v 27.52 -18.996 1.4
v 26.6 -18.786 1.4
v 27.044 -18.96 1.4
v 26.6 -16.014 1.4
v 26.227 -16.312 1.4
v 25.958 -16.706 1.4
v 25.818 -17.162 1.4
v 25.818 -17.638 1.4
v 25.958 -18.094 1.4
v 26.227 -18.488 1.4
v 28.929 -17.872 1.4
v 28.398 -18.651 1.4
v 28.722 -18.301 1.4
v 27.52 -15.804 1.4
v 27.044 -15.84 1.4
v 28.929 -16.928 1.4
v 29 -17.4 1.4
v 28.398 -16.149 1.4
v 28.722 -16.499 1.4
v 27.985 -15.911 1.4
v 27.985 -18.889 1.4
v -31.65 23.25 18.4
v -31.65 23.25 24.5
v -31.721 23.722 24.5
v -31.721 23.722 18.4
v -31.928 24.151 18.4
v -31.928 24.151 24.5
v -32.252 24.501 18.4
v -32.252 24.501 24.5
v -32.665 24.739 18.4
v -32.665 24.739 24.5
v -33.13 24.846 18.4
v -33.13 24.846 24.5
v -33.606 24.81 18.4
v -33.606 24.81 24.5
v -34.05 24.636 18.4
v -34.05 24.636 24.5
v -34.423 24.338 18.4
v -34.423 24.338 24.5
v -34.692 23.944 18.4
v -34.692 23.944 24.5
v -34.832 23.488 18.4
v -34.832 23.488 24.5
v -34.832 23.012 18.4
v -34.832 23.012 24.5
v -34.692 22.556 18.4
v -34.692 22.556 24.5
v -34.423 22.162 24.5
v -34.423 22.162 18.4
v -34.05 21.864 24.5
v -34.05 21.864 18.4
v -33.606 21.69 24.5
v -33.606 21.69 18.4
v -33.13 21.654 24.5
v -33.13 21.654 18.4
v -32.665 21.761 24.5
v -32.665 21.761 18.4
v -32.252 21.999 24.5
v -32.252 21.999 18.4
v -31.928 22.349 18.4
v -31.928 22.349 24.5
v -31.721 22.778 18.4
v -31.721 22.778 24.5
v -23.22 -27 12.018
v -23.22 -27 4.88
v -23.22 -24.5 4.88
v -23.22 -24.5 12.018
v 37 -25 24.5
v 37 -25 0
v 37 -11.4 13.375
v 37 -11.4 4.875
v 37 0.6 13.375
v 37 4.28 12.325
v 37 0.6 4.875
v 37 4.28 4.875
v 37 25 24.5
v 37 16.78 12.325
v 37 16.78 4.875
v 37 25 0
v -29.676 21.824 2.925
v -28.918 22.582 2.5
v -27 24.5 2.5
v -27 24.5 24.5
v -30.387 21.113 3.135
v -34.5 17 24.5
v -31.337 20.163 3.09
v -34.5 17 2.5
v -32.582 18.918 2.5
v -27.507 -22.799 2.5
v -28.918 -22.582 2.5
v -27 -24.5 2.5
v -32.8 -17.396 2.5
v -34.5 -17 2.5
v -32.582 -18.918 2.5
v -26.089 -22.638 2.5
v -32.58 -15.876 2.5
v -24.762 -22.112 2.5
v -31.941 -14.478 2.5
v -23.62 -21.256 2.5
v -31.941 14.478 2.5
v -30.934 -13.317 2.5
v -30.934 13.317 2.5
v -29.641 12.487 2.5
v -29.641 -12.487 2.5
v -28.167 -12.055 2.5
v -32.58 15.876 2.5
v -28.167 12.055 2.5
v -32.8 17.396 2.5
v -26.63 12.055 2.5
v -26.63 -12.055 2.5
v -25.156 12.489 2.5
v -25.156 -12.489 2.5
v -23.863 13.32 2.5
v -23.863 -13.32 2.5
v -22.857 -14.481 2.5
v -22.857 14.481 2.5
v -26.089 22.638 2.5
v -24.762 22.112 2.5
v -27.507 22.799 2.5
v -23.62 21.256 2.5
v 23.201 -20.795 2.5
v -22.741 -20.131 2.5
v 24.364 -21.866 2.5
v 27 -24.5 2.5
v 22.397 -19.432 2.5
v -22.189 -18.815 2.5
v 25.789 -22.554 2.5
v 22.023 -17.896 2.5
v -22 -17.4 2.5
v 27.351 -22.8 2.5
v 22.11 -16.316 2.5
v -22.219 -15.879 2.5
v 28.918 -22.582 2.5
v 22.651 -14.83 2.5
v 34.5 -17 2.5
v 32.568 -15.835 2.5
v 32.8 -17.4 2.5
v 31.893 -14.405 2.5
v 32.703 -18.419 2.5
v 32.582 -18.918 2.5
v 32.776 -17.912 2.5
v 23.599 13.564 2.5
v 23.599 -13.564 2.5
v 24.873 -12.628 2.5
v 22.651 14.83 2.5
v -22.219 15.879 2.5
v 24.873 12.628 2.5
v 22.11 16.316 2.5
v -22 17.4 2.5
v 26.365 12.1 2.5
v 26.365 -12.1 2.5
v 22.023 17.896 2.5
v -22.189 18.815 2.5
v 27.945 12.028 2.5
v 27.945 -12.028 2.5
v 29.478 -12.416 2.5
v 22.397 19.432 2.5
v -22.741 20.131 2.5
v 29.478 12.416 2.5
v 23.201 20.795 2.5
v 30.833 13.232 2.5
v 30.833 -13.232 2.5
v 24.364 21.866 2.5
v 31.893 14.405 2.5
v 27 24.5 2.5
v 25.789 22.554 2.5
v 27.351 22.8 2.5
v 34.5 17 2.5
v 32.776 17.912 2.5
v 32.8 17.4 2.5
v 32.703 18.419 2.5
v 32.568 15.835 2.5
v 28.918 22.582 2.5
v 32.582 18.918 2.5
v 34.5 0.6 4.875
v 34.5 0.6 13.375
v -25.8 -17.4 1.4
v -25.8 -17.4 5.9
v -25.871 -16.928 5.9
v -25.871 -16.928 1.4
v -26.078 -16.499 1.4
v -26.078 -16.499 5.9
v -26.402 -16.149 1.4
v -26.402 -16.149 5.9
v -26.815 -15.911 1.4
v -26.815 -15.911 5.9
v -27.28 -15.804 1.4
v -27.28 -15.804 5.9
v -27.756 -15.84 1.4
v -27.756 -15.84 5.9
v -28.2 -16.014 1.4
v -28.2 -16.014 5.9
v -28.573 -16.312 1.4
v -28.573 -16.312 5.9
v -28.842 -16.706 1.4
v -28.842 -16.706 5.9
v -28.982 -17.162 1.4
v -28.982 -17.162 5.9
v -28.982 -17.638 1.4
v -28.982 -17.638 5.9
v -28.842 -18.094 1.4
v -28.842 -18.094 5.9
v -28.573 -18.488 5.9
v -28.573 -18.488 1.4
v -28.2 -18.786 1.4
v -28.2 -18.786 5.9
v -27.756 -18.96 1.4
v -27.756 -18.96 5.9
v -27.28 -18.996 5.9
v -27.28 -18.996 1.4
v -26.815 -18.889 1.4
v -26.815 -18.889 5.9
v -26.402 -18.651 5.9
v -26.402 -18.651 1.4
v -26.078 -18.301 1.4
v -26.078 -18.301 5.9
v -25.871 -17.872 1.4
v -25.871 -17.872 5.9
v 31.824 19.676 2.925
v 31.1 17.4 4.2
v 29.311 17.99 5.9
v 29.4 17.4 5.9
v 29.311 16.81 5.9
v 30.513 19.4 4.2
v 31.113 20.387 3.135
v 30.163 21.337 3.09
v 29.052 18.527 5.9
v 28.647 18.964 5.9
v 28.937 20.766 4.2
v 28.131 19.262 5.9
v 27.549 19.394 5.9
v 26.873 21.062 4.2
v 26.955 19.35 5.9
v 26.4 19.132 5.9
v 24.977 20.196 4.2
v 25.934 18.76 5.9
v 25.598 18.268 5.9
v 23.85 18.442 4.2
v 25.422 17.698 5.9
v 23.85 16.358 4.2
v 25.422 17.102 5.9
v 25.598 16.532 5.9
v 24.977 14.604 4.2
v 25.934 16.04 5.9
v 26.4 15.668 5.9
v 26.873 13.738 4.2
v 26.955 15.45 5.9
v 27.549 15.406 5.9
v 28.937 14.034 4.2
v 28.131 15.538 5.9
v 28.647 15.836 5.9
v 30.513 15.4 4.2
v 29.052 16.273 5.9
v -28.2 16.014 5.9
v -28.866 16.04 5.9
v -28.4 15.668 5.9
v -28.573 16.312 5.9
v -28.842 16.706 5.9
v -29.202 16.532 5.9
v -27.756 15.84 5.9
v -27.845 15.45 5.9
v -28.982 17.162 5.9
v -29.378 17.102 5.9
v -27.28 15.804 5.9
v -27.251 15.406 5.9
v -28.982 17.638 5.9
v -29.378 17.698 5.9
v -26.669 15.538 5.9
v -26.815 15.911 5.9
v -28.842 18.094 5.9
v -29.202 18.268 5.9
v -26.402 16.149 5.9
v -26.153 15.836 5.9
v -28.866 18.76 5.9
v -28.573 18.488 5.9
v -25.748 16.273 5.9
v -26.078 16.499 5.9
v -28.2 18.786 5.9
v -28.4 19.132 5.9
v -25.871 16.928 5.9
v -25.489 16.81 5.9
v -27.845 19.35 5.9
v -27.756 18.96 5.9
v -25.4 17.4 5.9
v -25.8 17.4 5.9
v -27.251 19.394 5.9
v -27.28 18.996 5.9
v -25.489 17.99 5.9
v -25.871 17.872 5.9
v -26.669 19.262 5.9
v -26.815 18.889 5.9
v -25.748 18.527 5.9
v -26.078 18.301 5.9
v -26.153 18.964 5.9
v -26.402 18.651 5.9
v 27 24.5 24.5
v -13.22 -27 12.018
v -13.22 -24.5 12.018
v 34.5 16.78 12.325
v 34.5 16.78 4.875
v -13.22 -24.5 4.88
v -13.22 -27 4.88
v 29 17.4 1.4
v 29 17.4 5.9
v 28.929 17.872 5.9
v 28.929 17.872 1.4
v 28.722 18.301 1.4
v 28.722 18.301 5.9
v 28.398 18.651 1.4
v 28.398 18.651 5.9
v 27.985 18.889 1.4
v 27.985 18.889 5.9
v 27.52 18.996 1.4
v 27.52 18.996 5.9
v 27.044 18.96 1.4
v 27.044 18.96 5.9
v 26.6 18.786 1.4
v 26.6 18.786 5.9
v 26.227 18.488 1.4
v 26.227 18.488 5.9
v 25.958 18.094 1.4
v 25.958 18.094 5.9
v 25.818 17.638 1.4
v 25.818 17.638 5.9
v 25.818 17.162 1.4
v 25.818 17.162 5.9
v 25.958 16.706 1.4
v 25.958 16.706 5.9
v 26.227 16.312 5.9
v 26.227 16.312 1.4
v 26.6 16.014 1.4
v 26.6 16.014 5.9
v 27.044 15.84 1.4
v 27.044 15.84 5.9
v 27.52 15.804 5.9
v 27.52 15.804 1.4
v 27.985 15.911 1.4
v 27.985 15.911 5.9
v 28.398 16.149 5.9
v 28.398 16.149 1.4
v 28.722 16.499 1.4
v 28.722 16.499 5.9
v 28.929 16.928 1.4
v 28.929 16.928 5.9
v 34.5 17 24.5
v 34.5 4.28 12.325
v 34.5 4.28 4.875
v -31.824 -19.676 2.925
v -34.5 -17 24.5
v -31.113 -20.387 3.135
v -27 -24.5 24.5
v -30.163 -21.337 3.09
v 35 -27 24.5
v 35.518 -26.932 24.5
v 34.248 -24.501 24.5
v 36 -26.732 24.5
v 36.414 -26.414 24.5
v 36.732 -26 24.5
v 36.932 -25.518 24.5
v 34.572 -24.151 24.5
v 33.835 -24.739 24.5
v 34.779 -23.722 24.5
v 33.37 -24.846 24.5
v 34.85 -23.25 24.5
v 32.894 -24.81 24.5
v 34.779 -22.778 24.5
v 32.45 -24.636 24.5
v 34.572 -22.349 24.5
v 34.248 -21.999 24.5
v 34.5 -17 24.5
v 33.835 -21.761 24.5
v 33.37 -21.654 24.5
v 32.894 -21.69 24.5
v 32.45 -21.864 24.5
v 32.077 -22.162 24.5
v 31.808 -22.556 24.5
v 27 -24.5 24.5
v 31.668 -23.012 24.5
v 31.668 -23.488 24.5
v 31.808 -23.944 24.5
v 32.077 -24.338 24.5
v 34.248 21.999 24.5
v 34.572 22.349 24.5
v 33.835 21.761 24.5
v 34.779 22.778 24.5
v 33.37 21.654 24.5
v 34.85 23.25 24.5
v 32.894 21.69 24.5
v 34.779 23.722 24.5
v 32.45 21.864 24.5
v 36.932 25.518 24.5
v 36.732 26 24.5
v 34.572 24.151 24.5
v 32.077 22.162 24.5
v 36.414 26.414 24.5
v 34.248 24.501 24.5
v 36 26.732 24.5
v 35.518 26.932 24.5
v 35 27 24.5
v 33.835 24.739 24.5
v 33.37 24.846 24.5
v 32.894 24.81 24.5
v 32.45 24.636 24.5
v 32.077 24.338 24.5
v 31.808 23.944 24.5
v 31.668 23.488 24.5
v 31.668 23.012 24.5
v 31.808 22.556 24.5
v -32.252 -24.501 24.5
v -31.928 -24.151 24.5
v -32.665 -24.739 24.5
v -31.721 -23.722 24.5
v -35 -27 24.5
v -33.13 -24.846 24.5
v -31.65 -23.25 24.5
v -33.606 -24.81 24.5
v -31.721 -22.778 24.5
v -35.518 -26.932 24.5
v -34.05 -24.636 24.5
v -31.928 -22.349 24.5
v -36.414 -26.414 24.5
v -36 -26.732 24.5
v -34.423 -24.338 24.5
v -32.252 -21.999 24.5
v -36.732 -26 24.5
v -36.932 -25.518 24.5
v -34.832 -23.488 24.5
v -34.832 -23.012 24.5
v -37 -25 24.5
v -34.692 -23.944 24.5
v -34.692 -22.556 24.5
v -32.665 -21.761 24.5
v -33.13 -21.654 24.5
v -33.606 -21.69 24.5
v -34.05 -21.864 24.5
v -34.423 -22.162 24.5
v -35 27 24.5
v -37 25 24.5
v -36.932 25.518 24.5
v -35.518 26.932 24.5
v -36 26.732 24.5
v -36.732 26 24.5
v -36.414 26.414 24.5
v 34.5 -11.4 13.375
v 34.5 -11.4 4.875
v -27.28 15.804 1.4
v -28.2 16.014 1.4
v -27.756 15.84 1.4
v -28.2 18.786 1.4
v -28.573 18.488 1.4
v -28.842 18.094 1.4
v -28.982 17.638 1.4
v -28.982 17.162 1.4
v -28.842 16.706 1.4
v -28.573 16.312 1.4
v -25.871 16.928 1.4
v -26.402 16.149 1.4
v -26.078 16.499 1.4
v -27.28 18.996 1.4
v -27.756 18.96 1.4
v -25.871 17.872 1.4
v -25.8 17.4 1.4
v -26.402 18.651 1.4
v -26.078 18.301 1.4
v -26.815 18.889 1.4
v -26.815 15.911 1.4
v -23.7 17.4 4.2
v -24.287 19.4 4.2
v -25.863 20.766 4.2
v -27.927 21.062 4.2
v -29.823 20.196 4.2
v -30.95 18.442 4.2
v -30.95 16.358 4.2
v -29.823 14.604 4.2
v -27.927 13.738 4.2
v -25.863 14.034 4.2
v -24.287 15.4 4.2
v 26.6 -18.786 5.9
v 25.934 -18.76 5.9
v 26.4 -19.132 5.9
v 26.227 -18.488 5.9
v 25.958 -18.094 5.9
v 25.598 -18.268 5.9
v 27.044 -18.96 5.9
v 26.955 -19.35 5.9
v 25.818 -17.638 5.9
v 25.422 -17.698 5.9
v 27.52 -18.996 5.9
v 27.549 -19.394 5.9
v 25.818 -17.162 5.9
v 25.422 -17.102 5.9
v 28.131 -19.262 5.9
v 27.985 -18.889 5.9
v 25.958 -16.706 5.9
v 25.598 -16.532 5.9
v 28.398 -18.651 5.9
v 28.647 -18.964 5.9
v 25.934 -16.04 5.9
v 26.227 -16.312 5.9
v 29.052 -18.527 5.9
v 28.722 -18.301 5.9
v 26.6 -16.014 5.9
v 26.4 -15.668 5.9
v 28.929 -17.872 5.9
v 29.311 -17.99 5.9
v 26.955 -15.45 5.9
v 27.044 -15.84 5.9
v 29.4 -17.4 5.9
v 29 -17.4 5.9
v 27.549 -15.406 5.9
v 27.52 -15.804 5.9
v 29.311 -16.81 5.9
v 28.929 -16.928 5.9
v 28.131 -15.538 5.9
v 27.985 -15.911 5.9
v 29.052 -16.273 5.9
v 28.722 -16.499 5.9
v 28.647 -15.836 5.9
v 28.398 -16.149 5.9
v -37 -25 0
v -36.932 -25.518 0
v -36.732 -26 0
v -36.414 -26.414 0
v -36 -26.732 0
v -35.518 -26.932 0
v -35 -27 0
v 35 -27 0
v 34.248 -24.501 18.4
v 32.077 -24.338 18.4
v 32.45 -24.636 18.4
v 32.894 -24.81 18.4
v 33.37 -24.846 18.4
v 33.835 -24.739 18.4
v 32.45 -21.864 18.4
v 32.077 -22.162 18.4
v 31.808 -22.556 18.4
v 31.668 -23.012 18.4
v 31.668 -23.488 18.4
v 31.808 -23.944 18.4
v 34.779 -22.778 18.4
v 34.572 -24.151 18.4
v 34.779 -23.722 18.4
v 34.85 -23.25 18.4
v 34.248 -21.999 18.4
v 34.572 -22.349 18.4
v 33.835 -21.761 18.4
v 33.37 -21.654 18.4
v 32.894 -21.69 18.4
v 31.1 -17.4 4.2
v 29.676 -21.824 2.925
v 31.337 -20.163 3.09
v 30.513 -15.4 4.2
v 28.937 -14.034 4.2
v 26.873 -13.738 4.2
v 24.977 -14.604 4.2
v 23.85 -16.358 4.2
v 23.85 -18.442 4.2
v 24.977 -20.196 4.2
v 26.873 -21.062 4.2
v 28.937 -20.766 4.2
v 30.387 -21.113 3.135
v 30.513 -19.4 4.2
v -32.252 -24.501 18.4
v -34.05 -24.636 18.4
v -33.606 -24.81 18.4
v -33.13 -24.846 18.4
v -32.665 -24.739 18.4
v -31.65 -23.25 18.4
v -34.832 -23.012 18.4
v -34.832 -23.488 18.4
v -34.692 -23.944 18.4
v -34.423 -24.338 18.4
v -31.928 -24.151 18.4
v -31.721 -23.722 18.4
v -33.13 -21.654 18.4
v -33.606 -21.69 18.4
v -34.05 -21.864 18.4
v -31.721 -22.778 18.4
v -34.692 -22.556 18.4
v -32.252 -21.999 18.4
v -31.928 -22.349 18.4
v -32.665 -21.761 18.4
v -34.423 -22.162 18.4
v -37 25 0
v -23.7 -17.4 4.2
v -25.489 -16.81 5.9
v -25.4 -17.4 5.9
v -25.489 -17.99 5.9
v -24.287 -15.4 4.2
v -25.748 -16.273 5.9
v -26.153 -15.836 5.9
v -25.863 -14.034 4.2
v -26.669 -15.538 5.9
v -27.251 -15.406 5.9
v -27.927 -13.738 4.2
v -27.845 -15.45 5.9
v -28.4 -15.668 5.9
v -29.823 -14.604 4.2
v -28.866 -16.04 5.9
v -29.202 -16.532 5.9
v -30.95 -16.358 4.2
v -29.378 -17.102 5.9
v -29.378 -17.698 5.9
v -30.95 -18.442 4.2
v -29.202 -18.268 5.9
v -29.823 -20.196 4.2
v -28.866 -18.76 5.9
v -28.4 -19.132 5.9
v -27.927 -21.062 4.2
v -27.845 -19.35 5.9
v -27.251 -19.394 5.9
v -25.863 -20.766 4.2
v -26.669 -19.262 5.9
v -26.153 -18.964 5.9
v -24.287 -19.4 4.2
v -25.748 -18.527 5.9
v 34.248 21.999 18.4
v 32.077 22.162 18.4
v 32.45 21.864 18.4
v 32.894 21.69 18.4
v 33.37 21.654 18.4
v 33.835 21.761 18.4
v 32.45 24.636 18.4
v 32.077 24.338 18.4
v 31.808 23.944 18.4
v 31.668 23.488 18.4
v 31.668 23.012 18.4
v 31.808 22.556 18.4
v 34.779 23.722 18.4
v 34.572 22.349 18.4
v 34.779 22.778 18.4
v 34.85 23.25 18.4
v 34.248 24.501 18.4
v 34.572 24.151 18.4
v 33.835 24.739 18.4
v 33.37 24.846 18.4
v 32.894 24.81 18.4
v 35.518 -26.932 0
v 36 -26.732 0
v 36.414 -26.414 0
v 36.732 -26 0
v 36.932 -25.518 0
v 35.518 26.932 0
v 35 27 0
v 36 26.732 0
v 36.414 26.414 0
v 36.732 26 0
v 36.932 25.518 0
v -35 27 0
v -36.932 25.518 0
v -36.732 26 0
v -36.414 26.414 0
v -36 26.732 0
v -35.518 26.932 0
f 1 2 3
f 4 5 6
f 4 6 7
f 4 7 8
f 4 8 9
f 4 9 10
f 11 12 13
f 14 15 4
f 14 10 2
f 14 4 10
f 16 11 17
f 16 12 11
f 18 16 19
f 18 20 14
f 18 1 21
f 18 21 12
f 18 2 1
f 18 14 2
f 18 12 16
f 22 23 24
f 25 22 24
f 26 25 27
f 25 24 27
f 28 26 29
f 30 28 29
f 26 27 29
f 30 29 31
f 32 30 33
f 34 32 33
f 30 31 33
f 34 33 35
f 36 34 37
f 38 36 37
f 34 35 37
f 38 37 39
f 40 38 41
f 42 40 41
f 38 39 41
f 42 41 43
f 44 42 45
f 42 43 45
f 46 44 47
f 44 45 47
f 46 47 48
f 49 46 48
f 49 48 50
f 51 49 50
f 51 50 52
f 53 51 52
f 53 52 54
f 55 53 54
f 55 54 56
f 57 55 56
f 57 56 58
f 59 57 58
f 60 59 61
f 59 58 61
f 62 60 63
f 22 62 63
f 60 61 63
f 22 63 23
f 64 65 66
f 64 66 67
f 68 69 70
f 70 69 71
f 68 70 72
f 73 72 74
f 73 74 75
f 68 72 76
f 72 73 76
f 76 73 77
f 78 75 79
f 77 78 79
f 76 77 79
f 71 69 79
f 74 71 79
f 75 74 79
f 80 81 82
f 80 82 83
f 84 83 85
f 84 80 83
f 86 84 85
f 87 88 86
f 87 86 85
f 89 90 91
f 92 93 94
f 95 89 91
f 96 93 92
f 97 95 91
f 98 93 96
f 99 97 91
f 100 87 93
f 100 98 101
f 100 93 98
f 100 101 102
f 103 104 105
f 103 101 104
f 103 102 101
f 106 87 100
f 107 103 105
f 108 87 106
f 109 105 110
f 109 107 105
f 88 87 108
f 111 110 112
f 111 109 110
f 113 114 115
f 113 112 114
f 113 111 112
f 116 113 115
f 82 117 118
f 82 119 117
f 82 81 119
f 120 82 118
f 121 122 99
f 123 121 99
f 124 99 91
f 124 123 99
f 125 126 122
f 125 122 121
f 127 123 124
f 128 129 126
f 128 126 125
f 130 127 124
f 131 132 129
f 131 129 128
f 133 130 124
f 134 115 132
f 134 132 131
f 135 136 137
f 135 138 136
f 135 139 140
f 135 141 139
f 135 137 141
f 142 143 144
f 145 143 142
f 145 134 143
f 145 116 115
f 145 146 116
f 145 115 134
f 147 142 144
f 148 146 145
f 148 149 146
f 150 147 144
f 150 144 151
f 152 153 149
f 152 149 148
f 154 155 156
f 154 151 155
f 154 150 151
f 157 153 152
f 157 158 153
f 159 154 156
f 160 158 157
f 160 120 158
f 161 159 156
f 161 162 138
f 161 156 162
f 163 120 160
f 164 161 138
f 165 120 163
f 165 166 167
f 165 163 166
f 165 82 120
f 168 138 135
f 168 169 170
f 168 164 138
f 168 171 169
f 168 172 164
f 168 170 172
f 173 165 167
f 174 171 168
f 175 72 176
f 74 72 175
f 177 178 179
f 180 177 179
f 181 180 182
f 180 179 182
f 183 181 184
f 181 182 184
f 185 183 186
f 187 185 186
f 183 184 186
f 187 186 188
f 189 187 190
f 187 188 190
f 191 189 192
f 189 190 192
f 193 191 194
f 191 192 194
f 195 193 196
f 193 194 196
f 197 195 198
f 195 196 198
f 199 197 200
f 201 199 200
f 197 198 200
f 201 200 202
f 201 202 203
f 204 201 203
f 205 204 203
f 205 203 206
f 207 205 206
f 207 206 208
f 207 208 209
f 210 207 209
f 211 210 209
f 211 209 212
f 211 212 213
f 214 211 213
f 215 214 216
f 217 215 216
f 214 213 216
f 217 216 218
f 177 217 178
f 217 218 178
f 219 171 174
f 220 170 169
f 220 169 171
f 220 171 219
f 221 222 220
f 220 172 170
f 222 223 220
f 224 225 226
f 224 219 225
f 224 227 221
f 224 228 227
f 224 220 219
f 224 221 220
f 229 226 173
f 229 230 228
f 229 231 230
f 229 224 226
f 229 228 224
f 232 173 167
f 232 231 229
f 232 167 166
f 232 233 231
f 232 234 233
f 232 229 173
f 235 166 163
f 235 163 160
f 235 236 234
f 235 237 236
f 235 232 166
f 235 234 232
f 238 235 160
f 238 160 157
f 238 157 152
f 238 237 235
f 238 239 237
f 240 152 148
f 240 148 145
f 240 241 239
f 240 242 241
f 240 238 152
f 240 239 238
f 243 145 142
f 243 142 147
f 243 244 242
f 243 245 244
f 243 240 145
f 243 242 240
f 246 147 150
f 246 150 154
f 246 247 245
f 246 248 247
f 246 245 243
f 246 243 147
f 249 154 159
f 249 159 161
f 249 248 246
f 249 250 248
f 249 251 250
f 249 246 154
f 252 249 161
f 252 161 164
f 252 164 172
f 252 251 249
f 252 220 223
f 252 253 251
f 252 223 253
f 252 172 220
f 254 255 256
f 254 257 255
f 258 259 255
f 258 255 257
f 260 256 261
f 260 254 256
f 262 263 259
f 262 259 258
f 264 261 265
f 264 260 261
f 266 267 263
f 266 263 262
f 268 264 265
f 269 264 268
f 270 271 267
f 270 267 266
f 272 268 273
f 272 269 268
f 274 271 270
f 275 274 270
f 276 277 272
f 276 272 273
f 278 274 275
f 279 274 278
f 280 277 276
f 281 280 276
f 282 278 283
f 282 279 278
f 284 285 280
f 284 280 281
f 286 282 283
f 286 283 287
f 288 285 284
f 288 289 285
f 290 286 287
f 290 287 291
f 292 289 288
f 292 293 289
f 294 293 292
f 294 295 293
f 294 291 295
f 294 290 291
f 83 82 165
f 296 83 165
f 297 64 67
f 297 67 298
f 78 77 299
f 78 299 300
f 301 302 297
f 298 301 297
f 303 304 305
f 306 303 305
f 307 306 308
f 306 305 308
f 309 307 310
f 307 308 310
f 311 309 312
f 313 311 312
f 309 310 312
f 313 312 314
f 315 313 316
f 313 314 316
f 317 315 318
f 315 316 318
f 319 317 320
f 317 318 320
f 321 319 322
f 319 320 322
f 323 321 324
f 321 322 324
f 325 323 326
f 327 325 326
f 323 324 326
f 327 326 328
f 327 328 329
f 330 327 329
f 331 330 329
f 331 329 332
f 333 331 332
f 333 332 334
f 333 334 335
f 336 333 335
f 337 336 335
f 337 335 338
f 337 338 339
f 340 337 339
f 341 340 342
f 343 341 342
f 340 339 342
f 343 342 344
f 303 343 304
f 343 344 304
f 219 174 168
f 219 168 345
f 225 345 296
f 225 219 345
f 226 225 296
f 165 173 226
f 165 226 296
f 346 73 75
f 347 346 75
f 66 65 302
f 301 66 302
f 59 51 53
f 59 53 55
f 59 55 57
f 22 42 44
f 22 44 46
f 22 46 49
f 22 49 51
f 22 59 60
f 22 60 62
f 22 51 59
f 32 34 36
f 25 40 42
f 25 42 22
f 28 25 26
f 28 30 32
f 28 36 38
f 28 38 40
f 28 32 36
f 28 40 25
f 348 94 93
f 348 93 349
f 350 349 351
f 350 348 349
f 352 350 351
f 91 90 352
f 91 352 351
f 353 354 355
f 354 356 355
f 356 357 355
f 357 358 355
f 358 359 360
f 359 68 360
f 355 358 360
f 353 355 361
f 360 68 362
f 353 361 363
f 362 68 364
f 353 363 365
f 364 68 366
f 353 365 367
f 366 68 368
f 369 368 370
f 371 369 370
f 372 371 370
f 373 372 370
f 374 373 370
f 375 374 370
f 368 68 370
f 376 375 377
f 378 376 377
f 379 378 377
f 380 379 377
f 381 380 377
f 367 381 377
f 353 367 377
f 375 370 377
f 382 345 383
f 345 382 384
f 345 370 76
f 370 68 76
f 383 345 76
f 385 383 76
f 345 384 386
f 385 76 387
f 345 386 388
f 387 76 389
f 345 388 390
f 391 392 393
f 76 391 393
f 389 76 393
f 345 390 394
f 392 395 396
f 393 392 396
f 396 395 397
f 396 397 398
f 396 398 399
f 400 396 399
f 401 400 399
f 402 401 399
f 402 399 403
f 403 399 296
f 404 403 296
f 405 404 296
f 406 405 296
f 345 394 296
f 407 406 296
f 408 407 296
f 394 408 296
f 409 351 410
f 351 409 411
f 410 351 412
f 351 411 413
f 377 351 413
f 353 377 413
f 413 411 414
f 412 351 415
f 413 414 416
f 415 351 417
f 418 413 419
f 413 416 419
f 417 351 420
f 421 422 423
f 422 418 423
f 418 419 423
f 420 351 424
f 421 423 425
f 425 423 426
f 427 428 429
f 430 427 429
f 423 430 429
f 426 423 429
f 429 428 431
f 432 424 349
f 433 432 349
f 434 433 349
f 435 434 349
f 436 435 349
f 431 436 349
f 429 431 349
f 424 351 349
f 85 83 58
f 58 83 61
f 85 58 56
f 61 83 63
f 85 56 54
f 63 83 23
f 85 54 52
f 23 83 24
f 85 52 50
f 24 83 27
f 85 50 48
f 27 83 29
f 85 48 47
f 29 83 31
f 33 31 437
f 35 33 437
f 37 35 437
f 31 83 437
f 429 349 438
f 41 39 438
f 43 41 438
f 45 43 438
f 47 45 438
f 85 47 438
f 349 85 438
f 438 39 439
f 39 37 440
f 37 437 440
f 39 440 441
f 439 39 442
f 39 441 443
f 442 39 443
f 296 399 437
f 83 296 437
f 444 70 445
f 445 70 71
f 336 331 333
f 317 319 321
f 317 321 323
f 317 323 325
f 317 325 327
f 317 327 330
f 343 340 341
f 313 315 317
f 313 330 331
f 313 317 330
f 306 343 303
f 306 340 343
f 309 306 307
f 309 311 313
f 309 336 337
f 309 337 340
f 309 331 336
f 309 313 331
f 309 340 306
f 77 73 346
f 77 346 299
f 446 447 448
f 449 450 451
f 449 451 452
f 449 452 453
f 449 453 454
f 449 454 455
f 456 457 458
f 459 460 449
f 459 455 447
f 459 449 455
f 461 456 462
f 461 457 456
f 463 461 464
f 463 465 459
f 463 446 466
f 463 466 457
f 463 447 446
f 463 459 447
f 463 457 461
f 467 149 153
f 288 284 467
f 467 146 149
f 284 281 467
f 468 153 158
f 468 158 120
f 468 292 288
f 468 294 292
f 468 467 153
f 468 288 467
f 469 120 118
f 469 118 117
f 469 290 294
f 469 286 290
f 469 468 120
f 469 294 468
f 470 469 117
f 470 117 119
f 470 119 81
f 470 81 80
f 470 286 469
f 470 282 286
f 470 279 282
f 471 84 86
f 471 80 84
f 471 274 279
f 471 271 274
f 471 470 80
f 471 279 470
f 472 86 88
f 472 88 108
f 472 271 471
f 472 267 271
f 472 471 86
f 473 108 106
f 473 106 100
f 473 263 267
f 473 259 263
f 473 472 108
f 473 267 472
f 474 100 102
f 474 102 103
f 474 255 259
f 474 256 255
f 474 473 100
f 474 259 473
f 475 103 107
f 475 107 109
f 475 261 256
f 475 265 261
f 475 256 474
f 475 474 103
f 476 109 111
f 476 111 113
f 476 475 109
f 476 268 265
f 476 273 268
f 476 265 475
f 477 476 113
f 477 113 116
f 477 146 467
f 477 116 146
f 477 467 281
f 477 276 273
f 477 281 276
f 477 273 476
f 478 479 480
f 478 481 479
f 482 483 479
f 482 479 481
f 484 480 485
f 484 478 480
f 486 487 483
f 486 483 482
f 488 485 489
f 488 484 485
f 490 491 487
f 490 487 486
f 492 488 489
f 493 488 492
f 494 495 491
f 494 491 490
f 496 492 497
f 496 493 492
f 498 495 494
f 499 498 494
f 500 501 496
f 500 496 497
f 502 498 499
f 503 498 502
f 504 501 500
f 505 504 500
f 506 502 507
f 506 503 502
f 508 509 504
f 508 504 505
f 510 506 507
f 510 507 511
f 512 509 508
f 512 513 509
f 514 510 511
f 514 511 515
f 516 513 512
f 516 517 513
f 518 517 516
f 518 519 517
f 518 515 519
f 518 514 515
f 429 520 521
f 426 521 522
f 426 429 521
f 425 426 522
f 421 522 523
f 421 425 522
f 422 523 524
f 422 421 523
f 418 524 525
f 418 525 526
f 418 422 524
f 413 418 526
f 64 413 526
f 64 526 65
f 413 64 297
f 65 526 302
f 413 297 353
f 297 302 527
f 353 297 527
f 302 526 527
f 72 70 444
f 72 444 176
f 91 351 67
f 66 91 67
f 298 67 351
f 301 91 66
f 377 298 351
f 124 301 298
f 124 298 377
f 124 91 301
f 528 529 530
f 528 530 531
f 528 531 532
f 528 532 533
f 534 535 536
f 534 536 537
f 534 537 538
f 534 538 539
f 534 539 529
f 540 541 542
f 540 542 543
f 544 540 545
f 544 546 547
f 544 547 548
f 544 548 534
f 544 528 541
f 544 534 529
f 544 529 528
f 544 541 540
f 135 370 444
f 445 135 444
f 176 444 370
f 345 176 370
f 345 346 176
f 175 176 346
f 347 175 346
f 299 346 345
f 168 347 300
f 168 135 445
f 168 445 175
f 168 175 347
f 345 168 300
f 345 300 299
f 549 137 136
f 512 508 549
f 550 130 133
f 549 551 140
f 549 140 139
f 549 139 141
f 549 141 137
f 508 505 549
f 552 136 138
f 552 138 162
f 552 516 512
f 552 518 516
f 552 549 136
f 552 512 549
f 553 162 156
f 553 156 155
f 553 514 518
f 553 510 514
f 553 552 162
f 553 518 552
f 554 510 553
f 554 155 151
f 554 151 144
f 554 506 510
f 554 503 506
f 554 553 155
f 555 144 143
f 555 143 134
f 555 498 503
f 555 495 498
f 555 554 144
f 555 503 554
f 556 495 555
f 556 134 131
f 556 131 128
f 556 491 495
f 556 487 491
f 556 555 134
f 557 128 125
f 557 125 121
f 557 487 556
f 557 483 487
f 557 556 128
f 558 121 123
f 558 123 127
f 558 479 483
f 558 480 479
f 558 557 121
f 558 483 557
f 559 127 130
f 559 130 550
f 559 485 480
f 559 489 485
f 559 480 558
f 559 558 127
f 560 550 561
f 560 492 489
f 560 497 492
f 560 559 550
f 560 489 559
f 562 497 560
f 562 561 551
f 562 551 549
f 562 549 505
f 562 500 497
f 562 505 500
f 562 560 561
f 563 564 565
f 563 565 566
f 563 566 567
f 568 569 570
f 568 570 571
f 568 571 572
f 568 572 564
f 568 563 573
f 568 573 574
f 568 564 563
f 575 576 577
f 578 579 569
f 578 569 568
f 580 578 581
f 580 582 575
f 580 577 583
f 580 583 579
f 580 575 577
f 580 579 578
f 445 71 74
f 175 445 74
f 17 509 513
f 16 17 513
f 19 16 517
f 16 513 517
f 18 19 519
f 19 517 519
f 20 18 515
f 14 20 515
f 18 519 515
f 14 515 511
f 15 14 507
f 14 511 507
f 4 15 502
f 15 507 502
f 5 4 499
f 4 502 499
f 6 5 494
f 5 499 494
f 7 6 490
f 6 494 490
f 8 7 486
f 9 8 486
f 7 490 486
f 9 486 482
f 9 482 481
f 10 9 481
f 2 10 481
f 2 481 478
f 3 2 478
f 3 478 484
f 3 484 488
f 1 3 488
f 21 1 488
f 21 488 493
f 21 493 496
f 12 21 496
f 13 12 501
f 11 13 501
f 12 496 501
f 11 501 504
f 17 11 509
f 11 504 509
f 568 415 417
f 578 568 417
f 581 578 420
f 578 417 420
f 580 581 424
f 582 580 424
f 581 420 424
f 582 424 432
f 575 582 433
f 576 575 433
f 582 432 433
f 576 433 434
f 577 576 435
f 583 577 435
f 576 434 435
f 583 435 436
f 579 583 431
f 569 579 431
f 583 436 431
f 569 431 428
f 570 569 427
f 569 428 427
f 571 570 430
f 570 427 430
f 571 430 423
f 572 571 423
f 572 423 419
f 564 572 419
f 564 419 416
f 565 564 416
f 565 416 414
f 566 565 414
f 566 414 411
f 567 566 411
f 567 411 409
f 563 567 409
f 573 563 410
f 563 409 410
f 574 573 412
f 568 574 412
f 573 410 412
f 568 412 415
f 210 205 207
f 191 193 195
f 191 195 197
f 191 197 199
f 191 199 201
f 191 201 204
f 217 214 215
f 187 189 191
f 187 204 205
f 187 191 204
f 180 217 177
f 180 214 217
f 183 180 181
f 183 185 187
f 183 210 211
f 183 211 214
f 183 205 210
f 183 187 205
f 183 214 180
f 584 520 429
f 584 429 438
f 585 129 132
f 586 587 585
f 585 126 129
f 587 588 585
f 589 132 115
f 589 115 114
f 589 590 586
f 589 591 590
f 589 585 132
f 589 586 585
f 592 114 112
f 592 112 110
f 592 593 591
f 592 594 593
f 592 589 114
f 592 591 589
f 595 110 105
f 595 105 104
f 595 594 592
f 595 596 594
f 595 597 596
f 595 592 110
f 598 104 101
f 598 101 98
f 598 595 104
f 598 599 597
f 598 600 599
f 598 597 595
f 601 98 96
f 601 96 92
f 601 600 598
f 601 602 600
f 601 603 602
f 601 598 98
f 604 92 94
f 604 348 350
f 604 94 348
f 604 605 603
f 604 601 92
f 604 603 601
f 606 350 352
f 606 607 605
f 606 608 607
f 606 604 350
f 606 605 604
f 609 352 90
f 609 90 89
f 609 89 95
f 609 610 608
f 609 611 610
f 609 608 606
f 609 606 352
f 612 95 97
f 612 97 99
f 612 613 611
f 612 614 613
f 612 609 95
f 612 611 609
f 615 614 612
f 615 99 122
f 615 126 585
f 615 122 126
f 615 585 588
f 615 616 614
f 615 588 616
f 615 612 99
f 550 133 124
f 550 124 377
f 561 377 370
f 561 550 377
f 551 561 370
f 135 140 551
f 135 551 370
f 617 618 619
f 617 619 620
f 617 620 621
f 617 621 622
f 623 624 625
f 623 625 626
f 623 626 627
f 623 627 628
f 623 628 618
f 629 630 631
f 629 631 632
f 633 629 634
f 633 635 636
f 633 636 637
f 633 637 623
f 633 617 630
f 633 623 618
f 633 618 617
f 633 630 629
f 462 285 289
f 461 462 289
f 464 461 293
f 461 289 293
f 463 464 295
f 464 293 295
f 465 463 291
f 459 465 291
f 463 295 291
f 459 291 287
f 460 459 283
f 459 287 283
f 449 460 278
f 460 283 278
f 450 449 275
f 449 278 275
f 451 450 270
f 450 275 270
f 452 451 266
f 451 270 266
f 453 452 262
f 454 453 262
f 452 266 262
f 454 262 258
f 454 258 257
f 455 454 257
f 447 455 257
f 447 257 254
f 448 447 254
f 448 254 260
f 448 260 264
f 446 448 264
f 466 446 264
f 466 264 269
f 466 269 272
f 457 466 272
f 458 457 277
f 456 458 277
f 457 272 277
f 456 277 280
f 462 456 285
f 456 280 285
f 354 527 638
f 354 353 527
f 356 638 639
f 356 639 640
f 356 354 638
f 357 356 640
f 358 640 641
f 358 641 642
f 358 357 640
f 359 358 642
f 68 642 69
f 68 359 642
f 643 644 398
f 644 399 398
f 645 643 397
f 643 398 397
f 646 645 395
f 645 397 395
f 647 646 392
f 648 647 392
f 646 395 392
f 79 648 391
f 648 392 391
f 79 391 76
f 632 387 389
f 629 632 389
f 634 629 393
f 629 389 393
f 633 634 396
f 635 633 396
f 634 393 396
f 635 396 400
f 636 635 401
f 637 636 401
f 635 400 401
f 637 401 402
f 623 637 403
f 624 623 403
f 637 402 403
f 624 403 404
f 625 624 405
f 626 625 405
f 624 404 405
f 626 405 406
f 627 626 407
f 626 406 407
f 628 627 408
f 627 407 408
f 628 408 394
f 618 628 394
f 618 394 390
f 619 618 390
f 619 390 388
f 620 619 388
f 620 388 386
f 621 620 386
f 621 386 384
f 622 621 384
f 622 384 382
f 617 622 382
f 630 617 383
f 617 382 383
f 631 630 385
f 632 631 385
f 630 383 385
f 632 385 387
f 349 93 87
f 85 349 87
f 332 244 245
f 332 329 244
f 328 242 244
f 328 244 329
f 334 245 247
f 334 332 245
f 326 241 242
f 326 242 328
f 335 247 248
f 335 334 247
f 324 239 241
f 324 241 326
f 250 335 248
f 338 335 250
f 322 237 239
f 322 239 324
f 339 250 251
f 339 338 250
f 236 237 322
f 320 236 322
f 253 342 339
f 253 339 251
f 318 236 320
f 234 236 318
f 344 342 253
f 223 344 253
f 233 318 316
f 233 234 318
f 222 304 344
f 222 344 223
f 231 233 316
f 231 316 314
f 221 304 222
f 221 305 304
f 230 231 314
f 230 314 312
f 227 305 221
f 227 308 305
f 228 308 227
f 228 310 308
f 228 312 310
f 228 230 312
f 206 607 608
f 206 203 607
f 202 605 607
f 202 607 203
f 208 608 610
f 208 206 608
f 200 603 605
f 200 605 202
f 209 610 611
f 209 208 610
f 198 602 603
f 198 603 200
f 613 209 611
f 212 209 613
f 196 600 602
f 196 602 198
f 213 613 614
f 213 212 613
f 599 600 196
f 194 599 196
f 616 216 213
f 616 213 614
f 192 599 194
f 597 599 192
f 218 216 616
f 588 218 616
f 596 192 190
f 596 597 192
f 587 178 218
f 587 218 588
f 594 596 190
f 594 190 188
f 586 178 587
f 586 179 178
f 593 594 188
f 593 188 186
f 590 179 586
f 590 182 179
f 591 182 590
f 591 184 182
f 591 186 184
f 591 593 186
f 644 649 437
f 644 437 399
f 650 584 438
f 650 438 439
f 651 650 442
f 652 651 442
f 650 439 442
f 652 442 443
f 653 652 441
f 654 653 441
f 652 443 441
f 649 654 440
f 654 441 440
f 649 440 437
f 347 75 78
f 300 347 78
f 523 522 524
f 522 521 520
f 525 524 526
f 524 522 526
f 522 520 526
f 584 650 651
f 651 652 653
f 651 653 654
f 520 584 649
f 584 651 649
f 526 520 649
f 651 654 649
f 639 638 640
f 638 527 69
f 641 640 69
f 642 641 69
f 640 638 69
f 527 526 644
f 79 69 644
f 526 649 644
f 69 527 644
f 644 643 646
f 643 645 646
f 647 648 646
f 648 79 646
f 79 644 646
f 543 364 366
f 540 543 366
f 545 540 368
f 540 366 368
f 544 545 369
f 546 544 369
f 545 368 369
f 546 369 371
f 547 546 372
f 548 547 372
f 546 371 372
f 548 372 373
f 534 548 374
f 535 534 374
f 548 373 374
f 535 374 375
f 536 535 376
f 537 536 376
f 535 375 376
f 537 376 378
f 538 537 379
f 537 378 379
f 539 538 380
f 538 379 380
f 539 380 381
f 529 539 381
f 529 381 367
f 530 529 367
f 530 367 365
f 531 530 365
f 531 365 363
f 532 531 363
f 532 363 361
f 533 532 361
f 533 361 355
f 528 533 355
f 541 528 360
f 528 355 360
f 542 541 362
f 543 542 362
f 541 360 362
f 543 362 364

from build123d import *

# Parameters (mm, degrees)
SKETCH5_W           = 74
SKETCH5_H           = 54
BOSS_EXTRUDE4_DEPTH = 24.5
SHELL1_T            = -2.5
SKETCH6_R           = 2
BOSS_EXTRUDE5_DEPTH = 3.4
SKETCH11_R          = 1.6
CUT_EXTRUDE2_DEPTH  = 4.5
CUT_EXTRUDE4_REACH  = 84.494
SKETCH12_W          = 7.45
SKETCH12_H          = 12.5
CUT_EXTRUDE5_REACH  = 84.494
SKETCH13_W          = 8.5
SKETCH13_H          = 12
CUT_EXTRUDE6_REACH  = 71.895
SKETCH14_W          = 10
SKETCH14_H          = 7.138154435
BOSS_EXTRUDE7_DEPTH = 22
SKETCH9_R           = 1.6
CUT_EXTRUDE1_DEPTH  = 6.1
CHAMFER10_SIZE      = 3.4
CHAMFER11_SIZE      = 3.4
FILLET1_R           = 2


with BuildPart() as part:
    # Sketch5 → Boss-Extrude4 (new body)
    with BuildSketch(Plane.XY):
        Rectangle(SKETCH5_W, SKETCH5_H)
    extrude(amount=BOSS_EXTRUDE4_DEPTH)

    # Shell1
    shell1_openings = [part.faces().sort_by_distance(p)[0] for p in [
        (0, 0, 24.5),
    ]]
    offset(amount=SHELL1_T, openings=shell1_openings, kind=Kind.INTERSECTION)

    # Sketch6 → Boss-Extrude5 (add)
    with BuildSketch(Plane.XY.offset(2.5)):
        with Locations((-27.4, 17.4)):
            Circle(SKETCH6_R)
        with Locations((27.4, 17.4)):
            Circle(SKETCH6_R)
        with Locations((27.4, -17.4)):
            Circle(SKETCH6_R)
        with Locations((-27.4, -17.4)):
            Circle(SKETCH6_R)
    extrude(amount=BOSS_EXTRUDE5_DEPTH)

    # Sketch11 → Cut-Extrude2 (cut)
    with BuildSketch(Plane.XY.offset(5.9)):
        with Locations((-27.4, 17.4)):
            Circle(SKETCH11_R)
        with Locations((27.4, 17.4)):
            Circle(SKETCH11_R)
        with Locations((-27.4, -17.4)):
            Circle(SKETCH11_R)
        with Locations((27.4, -17.4)):
            Circle(SKETCH11_R)
    extrude(amount=-CUT_EXTRUDE2_DEPTH, mode=Mode.SUBTRACT)

    # Sketch12 → Cut-Extrude4 (cut, up to next)
    with BuildSketch(Plane(origin=(37, 0, 0), x_dir=(0, 0, -1), z_dir=(1, 0, 0)), mode=Mode.PRIVATE) as cut_extrude4_sk1:
        with Locations((-8.6, 10.53)):
            Rectangle(SKETCH12_W, SKETCH12_H)
    cut_extrude4_tool1 = extrude(cut_extrude4_sk1.sketch, amount=-CUT_EXTRUDE4_REACH, mode=Mode.PRIVATE) & part.part
    add(cut_extrude4_tool1.solids().sort_by_distance((37, 10.53, 8.6))[0], mode=Mode.SUBTRACT)

    # Sketch13 → Cut-Extrude5 (cut, up to next)
    with BuildSketch(Plane(origin=(37, 0, 0), x_dir=(0, 0, -1), z_dir=(1, 0, 0)), mode=Mode.PRIVATE) as cut_extrude5_sk1:
        with Locations((-9.125, -5.4)):
            Rectangle(SKETCH13_W, SKETCH13_H)
    cut_extrude5_tool1 = extrude(cut_extrude5_sk1.sketch, amount=-CUT_EXTRUDE5_REACH, mode=Mode.PRIVATE) & part.part
    add(cut_extrude5_tool1.solids().sort_by_distance((37, -5.4, 9.125))[0], mode=Mode.SUBTRACT)

    # Sketch14 → Cut-Extrude6 (cut, up to next)
    with BuildSketch(Plane.XZ.offset(27), mode=Mode.PRIVATE) as cut_extrude6_sk1:
        with Locations((-18.22, 8.449077218)):
            Rectangle(SKETCH14_W, SKETCH14_H)
    cut_extrude6_tool1 = extrude(cut_extrude6_sk1.sketch, amount=-CUT_EXTRUDE6_REACH, mode=Mode.PRIVATE) & part.part
    add(cut_extrude6_tool1.solids().sort_by_distance((-18.22, -27, 8.449077))[0], mode=Mode.SUBTRACT)

    # Sketch7 → Boss-Extrude7 (add)
    with BuildSketch(Plane.XY.offset(2.5)):
        Polygon((-27, 24.5), (-34.5, 17), (-34.5, 24.5), align=None)
        Polygon((-34.5, -17), (-27, -24.5), (-34.5, -24.5), align=None)
        Polygon((27, -24.5), (34.5, -17), (34.5, -24.5), align=None)
        Polygon((34.5, 17), (27, 24.5), (34.5, 24.5), align=None)
    extrude(amount=BOSS_EXTRUDE7_DEPTH)

    # Sketch9 → Cut-Extrude1 (cut)
    with BuildSketch(Plane.XY.offset(24.5)):
        with Locations((-33.25, 23.25)):
            Circle(SKETCH9_R)
        with Locations((33.25, 23.25)):
            Circle(SKETCH9_R)
        with Locations((-33.25, -23.25)):
            Circle(SKETCH9_R)
        with Locations((33.25, -23.25)):
            Circle(SKETCH9_R)
    extrude(amount=-CUT_EXTRUDE1_DEPTH, mode=Mode.SUBTRACT)

    # Chamfer10
    # the kernel refuses this chamfer: 3.4 mm, written as the material it adds along each edge
    with BuildSketch(Plane(origin=(-27.4, 17.4, 2.5), x_dir=(1, 0, 0), z_dir=(0, -1, 0))) as chamfer10_piece_1_section:
        Polygon((2 + CHAMFER10_SIZE, 0), (2, CHAMFER10_SIZE), (2, 0), align=None)
    chamfer10_piece_1 = revolve(axis=Axis((-27.4, 17.4, 2.5), (0, 0, 1)), mode=Mode.PRIVATE)
    chamfer10_piece_1 = split(chamfer10_piece_1, bisect_by=Plane(origin=(-31.112764442, 17.4, 5.9), z_dir=(0, 0, -1)), keep=Keep.TOP, mode=Mode.PRIVATE)
    add(chamfer10_piece_1)

    # Chamfer11
    # the kernel refuses this chamfer: 3.4 mm, written as the material it adds along each edge
    with BuildSketch(Plane(origin=(27.4, 17.4, 2.5), x_dir=(1, 0, 0), z_dir=(0, -1, 0))) as chamfer11_piece_1_section:
        Polygon((2 + CHAMFER11_SIZE, 0), (2, CHAMFER11_SIZE), (2, 0), align=None)
    chamfer11_piece_1 = revolve(axis=Axis((27.4, 17.4, 2.5), (0, 0, 1)), mode=Mode.PRIVATE)
    chamfer11_piece_1 = split(chamfer11_piece_1, bisect_by=Plane(origin=(23.687235558, 17.4, 5.9), z_dir=(0, 0, -1)), keep=Keep.TOP, mode=Mode.PRIVATE)
    add(chamfer11_piece_1)
    with BuildSketch(Plane(origin=(27.4, -17.4, 2.5), x_dir=(1, 0, 0), z_dir=(0, -1, 0))) as chamfer11_piece_2_section:
        Polygon((2 + CHAMFER11_SIZE, 0), (2, CHAMFER11_SIZE), (2, 0), align=None)
    chamfer11_piece_2 = revolve(axis=Axis((27.4, -17.4, 2.5), (0, 0, 1)), mode=Mode.PRIVATE)
    chamfer11_piece_2 = split(chamfer11_piece_2, bisect_by=Plane(origin=(23.687235558, -17.4, 5.9), z_dir=(0, 0, -1)), keep=Keep.TOP, mode=Mode.PRIVATE)
    add(chamfer11_piece_2)
    with BuildSketch(Plane(origin=(-27.4, -17.4, 2.5), x_dir=(1, 0, 0), z_dir=(0, -1, 0))) as chamfer11_piece_3_section:
        Polygon((2 + CHAMFER11_SIZE, 0), (2, CHAMFER11_SIZE), (2, 0), align=None)
    chamfer11_piece_3 = revolve(axis=Axis((-27.4, -17.4, 2.5), (0, 0, 1)), mode=Mode.PRIVATE)
    chamfer11_piece_3 = split(chamfer11_piece_3, bisect_by=Plane(origin=(-31.112764442, -17.4, 5.9), z_dir=(0, 0, -1)), keep=Keep.TOP, mode=Mode.PRIVATE)
    add(chamfer11_piece_3)

    # Fillet1
    fillet1_edges = [part.edges().sort_by_distance(p)[0] for p in [
        (37, -27, 12.25),
        (-37, -27, 12.25),
        (-37, 27, 12.25),
        (37, 27, 12.25),
    ]]
    fillet(fillet1_edges, radius=FILLET1_R)


solid = part.part
